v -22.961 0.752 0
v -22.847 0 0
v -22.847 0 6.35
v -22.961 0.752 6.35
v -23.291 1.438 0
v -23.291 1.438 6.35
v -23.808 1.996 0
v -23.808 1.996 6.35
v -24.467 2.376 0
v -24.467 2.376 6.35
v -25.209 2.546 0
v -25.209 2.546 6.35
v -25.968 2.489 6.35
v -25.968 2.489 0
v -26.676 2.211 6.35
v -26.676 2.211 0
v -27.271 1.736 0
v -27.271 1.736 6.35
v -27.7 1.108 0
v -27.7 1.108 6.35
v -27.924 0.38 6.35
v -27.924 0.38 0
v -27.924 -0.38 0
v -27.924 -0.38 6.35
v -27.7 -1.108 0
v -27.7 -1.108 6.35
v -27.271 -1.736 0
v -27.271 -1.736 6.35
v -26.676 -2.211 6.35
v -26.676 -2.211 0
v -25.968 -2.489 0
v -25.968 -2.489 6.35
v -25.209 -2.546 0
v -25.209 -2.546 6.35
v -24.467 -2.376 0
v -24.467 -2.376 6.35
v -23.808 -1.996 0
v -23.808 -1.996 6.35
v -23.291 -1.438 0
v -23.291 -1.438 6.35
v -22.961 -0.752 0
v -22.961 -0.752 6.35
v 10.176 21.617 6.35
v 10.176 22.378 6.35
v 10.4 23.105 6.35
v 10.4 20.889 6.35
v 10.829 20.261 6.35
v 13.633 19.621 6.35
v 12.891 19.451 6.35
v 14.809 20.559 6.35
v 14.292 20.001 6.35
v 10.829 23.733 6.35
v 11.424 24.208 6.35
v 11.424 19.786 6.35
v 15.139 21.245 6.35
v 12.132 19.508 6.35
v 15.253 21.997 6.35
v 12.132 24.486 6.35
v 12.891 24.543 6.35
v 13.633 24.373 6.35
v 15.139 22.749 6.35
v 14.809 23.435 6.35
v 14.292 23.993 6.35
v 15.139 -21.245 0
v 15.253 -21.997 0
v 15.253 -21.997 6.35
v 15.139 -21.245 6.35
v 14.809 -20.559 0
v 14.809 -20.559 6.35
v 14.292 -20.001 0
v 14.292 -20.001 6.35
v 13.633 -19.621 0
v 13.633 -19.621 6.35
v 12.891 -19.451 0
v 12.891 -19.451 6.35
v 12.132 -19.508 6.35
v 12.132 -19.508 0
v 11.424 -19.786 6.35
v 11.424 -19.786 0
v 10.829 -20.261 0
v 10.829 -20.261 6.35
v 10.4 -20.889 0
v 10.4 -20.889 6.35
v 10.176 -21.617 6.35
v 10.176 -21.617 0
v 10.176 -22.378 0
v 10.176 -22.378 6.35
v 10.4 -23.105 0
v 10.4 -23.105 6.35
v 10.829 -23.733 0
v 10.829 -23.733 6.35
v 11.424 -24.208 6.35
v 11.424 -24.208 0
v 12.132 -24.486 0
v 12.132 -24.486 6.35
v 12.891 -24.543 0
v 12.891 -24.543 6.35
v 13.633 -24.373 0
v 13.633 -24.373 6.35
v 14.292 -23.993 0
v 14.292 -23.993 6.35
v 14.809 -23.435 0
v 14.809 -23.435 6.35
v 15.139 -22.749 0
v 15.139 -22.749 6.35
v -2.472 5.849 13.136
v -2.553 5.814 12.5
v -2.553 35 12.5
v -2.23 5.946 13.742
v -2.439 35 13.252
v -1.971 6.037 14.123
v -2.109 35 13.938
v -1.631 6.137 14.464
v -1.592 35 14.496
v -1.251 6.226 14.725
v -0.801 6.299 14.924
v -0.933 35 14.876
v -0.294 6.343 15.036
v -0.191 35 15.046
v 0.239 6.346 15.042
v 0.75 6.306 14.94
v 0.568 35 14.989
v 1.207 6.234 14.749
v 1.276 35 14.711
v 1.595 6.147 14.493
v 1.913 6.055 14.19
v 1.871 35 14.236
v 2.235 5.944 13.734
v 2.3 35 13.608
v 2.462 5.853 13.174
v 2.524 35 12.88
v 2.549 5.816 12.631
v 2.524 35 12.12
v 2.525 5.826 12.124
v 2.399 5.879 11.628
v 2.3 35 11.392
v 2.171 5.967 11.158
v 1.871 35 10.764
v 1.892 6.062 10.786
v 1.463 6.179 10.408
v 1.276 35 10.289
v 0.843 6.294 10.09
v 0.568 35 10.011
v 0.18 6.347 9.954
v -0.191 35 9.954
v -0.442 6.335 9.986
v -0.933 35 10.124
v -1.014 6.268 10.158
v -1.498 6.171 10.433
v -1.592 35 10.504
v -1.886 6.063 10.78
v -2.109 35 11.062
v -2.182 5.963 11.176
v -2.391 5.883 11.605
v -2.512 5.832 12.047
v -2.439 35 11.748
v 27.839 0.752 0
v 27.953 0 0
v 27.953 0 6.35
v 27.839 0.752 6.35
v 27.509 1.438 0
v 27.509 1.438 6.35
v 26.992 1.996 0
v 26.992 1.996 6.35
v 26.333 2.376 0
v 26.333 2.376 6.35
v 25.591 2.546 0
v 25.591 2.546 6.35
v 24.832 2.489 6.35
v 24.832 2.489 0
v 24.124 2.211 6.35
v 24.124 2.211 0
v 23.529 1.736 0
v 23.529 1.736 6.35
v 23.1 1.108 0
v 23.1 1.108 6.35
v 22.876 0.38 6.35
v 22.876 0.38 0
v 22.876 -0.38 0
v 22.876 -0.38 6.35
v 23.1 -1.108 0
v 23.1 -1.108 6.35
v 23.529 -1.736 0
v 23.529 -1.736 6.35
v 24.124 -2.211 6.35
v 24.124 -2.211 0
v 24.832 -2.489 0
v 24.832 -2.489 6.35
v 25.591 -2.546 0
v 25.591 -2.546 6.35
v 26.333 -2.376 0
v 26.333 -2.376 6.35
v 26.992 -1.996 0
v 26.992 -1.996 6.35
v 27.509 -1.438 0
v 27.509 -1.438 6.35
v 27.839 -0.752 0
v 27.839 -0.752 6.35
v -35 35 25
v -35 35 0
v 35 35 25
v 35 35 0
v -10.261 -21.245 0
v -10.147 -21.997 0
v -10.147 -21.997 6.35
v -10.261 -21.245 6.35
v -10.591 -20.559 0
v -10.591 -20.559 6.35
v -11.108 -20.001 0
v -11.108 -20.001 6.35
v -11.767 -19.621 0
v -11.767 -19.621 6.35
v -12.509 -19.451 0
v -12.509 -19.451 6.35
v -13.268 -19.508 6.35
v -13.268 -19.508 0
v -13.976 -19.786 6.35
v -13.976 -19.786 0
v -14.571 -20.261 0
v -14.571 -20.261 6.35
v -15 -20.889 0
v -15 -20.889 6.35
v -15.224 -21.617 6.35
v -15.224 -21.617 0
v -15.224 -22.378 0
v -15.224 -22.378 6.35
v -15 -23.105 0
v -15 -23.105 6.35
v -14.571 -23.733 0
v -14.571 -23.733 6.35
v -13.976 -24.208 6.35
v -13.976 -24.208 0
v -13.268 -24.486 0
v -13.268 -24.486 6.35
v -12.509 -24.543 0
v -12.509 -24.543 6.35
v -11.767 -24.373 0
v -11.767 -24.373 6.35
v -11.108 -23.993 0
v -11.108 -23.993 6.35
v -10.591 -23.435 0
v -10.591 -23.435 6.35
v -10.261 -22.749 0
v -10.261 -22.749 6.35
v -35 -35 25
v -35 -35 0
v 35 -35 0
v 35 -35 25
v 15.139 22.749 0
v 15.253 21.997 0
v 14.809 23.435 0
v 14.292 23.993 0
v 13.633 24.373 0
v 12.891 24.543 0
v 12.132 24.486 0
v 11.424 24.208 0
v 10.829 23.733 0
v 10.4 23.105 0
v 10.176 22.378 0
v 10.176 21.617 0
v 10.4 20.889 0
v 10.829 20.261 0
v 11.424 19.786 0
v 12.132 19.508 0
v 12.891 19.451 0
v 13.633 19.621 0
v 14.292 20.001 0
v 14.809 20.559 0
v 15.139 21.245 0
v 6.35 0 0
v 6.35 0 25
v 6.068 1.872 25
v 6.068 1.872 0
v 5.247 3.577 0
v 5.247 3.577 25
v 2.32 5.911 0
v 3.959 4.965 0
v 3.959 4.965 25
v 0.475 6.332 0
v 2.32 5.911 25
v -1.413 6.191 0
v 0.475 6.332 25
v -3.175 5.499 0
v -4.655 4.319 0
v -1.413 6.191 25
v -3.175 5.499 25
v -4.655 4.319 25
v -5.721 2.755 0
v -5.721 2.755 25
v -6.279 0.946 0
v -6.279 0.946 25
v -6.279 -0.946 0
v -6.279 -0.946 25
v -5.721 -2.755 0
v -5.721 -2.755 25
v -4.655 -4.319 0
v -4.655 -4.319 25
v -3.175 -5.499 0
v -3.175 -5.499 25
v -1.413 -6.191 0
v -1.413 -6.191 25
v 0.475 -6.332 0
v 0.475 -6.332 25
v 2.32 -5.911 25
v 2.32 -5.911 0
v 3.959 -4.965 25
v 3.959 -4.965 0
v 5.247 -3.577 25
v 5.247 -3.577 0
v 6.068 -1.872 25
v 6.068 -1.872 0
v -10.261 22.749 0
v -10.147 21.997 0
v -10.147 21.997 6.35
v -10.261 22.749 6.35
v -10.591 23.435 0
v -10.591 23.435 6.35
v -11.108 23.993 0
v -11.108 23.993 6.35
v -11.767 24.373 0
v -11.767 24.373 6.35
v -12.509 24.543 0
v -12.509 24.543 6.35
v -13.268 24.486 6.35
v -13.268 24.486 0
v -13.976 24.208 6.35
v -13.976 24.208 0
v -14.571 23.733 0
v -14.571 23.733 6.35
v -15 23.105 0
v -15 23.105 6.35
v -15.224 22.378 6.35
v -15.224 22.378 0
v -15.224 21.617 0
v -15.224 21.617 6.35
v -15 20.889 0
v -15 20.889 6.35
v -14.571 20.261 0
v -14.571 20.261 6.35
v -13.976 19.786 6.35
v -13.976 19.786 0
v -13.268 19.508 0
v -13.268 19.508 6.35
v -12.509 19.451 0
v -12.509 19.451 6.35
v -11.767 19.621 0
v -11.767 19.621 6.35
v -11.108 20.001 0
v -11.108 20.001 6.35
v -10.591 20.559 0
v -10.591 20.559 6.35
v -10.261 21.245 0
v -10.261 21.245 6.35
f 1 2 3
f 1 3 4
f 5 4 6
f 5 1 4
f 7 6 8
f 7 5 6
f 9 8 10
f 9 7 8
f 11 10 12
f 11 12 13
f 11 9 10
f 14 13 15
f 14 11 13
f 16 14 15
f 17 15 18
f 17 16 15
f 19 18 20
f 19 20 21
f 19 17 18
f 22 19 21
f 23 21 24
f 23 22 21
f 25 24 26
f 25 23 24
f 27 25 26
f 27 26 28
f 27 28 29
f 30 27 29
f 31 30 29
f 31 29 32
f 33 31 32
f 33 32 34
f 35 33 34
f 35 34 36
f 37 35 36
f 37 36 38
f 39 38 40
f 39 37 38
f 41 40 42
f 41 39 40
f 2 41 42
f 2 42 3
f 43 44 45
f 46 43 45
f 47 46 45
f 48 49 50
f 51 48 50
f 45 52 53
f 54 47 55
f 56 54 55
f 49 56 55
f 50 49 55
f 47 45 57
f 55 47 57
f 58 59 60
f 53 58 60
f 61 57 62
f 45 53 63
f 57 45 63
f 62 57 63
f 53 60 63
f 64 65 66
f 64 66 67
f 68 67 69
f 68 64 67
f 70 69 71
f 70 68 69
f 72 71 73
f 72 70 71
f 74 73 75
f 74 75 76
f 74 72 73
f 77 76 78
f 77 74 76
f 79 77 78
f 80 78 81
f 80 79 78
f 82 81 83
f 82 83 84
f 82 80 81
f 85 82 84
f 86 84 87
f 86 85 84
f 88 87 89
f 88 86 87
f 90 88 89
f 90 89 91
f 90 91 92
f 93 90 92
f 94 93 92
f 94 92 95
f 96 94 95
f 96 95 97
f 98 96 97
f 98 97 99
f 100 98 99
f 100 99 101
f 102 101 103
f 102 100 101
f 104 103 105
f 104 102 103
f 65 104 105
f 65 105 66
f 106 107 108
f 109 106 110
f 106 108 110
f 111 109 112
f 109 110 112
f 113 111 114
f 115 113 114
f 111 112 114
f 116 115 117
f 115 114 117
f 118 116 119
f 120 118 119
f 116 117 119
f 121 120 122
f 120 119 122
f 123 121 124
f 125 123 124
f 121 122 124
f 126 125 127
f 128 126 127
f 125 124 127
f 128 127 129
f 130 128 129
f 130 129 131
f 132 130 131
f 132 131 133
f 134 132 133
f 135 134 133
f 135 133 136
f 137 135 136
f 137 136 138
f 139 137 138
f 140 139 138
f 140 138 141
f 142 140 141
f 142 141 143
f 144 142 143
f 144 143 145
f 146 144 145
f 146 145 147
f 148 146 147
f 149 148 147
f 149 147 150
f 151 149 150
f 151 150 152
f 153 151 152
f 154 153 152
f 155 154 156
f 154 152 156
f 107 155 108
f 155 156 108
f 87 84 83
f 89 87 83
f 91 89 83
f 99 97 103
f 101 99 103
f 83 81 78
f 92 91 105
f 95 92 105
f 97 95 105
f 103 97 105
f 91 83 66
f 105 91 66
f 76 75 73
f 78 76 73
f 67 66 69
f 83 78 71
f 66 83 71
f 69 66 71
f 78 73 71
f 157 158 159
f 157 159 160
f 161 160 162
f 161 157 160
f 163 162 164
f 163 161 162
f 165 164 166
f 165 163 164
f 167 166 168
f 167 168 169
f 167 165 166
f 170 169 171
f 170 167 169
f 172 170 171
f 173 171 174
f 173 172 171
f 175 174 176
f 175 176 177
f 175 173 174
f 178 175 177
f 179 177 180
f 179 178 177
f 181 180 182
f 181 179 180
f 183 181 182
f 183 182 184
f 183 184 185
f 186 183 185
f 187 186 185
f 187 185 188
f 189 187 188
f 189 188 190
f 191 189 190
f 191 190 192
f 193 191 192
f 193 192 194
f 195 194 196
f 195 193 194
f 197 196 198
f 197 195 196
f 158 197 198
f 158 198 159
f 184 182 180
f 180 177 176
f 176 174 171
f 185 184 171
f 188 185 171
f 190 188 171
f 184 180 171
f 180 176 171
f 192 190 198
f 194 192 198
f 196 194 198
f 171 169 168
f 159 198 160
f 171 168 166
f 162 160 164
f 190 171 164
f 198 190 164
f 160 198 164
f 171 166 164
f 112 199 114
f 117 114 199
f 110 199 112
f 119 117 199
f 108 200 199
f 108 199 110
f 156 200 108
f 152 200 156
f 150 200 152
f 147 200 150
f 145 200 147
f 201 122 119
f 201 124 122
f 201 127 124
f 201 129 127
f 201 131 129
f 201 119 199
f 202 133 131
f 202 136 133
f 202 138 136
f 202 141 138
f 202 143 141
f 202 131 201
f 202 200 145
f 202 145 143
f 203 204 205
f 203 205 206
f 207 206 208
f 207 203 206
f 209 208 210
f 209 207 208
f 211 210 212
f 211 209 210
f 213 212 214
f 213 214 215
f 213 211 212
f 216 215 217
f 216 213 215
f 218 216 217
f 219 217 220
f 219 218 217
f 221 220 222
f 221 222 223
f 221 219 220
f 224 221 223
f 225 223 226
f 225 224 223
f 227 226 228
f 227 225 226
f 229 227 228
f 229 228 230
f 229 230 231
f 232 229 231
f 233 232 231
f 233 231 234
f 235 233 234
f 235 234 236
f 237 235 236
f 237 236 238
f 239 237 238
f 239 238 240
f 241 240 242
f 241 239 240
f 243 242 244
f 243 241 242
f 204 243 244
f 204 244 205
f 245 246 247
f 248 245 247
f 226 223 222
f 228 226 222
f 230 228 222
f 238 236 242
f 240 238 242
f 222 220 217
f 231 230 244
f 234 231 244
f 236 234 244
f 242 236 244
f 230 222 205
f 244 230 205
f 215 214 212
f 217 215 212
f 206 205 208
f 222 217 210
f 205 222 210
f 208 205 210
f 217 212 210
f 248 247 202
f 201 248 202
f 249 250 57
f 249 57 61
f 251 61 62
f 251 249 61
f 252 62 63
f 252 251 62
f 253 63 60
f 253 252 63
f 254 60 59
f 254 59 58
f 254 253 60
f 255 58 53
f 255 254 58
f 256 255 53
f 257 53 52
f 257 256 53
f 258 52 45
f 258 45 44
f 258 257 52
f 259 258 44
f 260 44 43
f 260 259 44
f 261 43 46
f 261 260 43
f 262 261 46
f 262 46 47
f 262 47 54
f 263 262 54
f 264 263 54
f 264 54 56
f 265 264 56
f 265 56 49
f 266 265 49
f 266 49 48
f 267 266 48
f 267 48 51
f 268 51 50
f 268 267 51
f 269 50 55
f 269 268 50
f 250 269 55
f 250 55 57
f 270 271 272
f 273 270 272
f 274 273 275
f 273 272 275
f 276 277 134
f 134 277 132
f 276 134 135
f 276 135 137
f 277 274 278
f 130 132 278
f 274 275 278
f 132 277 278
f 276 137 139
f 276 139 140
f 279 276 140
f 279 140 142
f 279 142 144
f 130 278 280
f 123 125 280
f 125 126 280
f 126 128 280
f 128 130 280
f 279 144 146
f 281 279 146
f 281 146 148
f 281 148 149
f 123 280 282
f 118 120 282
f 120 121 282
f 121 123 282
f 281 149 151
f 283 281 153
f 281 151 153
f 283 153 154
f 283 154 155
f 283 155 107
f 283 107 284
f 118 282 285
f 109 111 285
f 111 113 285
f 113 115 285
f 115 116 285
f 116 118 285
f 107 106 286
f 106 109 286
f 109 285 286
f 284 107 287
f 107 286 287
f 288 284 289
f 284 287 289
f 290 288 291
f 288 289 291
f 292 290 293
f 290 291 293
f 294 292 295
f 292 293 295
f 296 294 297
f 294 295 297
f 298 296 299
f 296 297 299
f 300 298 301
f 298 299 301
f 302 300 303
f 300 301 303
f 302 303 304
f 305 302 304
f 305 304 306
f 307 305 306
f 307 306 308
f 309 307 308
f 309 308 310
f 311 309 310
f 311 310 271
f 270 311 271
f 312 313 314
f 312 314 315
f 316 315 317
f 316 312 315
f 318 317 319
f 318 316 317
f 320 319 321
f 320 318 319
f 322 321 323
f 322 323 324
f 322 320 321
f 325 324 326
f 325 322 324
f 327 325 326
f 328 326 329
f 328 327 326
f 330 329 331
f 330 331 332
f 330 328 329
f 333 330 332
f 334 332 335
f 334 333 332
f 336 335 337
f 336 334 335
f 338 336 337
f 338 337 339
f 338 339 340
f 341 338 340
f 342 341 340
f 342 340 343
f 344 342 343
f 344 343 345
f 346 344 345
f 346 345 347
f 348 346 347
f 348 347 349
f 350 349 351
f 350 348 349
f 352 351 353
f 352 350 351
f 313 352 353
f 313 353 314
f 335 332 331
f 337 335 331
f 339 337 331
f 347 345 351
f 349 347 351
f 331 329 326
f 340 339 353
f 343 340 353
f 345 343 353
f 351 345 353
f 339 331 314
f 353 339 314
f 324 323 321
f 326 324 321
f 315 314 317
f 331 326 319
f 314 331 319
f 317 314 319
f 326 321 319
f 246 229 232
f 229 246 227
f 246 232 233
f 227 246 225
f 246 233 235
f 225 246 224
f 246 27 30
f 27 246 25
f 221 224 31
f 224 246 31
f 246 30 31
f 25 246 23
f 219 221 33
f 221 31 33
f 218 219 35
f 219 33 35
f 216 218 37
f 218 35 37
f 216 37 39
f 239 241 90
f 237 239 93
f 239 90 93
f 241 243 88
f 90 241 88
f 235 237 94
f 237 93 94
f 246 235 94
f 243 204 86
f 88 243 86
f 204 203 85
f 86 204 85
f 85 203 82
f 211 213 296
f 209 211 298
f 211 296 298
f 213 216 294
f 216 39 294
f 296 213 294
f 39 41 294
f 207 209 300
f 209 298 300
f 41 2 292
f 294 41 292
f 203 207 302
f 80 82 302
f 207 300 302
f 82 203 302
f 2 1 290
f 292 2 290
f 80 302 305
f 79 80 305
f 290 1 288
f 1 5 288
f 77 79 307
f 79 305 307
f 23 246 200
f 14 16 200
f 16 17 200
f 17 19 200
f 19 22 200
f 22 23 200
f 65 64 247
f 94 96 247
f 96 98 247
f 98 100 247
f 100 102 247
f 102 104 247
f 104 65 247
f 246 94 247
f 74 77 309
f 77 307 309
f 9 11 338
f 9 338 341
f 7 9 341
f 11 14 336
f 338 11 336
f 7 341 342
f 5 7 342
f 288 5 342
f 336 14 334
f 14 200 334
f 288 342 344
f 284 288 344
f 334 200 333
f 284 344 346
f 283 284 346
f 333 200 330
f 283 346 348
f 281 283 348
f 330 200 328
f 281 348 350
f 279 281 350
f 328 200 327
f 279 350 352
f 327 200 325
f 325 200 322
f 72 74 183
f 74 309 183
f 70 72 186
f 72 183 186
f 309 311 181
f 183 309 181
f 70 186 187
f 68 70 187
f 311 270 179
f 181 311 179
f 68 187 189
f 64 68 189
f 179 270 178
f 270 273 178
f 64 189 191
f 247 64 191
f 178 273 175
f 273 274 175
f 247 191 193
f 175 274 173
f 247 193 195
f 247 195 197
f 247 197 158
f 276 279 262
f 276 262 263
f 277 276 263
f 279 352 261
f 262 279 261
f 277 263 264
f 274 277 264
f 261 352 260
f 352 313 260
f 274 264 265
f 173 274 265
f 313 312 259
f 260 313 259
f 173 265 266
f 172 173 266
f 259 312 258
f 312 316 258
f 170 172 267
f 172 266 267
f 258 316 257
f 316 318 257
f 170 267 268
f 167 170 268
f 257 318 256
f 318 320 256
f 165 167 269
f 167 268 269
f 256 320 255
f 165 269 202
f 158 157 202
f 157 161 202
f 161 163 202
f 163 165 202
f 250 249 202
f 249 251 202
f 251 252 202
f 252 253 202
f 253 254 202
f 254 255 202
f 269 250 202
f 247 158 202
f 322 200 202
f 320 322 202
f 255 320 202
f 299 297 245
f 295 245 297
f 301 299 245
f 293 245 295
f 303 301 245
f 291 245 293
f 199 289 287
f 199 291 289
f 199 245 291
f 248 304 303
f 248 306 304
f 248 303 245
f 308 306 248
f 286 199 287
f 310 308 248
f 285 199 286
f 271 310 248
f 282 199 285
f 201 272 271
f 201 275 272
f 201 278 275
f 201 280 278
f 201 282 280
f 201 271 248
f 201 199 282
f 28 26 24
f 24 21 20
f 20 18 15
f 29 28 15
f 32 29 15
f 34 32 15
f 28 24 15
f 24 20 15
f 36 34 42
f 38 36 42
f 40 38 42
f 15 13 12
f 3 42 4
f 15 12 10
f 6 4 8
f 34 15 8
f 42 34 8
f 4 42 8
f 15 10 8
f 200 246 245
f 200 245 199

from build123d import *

# Parameters (mm, degrees)
F0_W     = 70
F0_H     = 70
F1_DEPTH = 25
F2_R     = 2.5527
F3_DEPTH = 6.35
F4_R     = 6.35
F5_DEPTH = 25
F6_R     = 2.5527
F7_DEPTH = 30.1856882138


with BuildPart() as f1:
    # F0 (on Top) → F1 (new body)
    with BuildSketch(Plane.XY):
        Rectangle(F0_W, F0_H)
    extrude(amount=F1_DEPTH)

    # F2 (on Top) → F3 (cut)
    with BuildSketch(Plane.XY):
        Circle(F2_R)
        with Locations((-25.4, 0)):
            Circle(F2_R)
        with Locations((-12.7, -21.9970452561)):
            Circle(F2_R)
        with Locations((12.7, -21.9970452561)):
            Circle(F2_R)
        with Locations((25.4, 0)):
            Circle(F2_R)
        with Locations((12.7, 21.9970452561)):
            Circle(F2_R)
        with Locations((-12.7, 21.9970452561)):
            Circle(F2_R)
    extrude(amount=F3_DEPTH, mode=Mode.SUBTRACT)

    # F4 (on face) → F5 (cut, through all)
    with BuildSketch(Plane.XY.offset(25)):
        Circle(F4_R)
    extrude(amount=-F5_DEPTH, mode=Mode.SUBTRACT)

    # F6 (on face) → F7 (cut, up to face)
    with BuildSketch(Plane(origin=(0, 35, 0), x_dir=(-1, 0, 0), z_dir=(0, 1, 0))):
        with Locations((0, 12.5)):
            Circle(F6_R)
    extrude(amount=-F7_DEPTH, mode=Mode.SUBTRACT)


solid = f1.part
